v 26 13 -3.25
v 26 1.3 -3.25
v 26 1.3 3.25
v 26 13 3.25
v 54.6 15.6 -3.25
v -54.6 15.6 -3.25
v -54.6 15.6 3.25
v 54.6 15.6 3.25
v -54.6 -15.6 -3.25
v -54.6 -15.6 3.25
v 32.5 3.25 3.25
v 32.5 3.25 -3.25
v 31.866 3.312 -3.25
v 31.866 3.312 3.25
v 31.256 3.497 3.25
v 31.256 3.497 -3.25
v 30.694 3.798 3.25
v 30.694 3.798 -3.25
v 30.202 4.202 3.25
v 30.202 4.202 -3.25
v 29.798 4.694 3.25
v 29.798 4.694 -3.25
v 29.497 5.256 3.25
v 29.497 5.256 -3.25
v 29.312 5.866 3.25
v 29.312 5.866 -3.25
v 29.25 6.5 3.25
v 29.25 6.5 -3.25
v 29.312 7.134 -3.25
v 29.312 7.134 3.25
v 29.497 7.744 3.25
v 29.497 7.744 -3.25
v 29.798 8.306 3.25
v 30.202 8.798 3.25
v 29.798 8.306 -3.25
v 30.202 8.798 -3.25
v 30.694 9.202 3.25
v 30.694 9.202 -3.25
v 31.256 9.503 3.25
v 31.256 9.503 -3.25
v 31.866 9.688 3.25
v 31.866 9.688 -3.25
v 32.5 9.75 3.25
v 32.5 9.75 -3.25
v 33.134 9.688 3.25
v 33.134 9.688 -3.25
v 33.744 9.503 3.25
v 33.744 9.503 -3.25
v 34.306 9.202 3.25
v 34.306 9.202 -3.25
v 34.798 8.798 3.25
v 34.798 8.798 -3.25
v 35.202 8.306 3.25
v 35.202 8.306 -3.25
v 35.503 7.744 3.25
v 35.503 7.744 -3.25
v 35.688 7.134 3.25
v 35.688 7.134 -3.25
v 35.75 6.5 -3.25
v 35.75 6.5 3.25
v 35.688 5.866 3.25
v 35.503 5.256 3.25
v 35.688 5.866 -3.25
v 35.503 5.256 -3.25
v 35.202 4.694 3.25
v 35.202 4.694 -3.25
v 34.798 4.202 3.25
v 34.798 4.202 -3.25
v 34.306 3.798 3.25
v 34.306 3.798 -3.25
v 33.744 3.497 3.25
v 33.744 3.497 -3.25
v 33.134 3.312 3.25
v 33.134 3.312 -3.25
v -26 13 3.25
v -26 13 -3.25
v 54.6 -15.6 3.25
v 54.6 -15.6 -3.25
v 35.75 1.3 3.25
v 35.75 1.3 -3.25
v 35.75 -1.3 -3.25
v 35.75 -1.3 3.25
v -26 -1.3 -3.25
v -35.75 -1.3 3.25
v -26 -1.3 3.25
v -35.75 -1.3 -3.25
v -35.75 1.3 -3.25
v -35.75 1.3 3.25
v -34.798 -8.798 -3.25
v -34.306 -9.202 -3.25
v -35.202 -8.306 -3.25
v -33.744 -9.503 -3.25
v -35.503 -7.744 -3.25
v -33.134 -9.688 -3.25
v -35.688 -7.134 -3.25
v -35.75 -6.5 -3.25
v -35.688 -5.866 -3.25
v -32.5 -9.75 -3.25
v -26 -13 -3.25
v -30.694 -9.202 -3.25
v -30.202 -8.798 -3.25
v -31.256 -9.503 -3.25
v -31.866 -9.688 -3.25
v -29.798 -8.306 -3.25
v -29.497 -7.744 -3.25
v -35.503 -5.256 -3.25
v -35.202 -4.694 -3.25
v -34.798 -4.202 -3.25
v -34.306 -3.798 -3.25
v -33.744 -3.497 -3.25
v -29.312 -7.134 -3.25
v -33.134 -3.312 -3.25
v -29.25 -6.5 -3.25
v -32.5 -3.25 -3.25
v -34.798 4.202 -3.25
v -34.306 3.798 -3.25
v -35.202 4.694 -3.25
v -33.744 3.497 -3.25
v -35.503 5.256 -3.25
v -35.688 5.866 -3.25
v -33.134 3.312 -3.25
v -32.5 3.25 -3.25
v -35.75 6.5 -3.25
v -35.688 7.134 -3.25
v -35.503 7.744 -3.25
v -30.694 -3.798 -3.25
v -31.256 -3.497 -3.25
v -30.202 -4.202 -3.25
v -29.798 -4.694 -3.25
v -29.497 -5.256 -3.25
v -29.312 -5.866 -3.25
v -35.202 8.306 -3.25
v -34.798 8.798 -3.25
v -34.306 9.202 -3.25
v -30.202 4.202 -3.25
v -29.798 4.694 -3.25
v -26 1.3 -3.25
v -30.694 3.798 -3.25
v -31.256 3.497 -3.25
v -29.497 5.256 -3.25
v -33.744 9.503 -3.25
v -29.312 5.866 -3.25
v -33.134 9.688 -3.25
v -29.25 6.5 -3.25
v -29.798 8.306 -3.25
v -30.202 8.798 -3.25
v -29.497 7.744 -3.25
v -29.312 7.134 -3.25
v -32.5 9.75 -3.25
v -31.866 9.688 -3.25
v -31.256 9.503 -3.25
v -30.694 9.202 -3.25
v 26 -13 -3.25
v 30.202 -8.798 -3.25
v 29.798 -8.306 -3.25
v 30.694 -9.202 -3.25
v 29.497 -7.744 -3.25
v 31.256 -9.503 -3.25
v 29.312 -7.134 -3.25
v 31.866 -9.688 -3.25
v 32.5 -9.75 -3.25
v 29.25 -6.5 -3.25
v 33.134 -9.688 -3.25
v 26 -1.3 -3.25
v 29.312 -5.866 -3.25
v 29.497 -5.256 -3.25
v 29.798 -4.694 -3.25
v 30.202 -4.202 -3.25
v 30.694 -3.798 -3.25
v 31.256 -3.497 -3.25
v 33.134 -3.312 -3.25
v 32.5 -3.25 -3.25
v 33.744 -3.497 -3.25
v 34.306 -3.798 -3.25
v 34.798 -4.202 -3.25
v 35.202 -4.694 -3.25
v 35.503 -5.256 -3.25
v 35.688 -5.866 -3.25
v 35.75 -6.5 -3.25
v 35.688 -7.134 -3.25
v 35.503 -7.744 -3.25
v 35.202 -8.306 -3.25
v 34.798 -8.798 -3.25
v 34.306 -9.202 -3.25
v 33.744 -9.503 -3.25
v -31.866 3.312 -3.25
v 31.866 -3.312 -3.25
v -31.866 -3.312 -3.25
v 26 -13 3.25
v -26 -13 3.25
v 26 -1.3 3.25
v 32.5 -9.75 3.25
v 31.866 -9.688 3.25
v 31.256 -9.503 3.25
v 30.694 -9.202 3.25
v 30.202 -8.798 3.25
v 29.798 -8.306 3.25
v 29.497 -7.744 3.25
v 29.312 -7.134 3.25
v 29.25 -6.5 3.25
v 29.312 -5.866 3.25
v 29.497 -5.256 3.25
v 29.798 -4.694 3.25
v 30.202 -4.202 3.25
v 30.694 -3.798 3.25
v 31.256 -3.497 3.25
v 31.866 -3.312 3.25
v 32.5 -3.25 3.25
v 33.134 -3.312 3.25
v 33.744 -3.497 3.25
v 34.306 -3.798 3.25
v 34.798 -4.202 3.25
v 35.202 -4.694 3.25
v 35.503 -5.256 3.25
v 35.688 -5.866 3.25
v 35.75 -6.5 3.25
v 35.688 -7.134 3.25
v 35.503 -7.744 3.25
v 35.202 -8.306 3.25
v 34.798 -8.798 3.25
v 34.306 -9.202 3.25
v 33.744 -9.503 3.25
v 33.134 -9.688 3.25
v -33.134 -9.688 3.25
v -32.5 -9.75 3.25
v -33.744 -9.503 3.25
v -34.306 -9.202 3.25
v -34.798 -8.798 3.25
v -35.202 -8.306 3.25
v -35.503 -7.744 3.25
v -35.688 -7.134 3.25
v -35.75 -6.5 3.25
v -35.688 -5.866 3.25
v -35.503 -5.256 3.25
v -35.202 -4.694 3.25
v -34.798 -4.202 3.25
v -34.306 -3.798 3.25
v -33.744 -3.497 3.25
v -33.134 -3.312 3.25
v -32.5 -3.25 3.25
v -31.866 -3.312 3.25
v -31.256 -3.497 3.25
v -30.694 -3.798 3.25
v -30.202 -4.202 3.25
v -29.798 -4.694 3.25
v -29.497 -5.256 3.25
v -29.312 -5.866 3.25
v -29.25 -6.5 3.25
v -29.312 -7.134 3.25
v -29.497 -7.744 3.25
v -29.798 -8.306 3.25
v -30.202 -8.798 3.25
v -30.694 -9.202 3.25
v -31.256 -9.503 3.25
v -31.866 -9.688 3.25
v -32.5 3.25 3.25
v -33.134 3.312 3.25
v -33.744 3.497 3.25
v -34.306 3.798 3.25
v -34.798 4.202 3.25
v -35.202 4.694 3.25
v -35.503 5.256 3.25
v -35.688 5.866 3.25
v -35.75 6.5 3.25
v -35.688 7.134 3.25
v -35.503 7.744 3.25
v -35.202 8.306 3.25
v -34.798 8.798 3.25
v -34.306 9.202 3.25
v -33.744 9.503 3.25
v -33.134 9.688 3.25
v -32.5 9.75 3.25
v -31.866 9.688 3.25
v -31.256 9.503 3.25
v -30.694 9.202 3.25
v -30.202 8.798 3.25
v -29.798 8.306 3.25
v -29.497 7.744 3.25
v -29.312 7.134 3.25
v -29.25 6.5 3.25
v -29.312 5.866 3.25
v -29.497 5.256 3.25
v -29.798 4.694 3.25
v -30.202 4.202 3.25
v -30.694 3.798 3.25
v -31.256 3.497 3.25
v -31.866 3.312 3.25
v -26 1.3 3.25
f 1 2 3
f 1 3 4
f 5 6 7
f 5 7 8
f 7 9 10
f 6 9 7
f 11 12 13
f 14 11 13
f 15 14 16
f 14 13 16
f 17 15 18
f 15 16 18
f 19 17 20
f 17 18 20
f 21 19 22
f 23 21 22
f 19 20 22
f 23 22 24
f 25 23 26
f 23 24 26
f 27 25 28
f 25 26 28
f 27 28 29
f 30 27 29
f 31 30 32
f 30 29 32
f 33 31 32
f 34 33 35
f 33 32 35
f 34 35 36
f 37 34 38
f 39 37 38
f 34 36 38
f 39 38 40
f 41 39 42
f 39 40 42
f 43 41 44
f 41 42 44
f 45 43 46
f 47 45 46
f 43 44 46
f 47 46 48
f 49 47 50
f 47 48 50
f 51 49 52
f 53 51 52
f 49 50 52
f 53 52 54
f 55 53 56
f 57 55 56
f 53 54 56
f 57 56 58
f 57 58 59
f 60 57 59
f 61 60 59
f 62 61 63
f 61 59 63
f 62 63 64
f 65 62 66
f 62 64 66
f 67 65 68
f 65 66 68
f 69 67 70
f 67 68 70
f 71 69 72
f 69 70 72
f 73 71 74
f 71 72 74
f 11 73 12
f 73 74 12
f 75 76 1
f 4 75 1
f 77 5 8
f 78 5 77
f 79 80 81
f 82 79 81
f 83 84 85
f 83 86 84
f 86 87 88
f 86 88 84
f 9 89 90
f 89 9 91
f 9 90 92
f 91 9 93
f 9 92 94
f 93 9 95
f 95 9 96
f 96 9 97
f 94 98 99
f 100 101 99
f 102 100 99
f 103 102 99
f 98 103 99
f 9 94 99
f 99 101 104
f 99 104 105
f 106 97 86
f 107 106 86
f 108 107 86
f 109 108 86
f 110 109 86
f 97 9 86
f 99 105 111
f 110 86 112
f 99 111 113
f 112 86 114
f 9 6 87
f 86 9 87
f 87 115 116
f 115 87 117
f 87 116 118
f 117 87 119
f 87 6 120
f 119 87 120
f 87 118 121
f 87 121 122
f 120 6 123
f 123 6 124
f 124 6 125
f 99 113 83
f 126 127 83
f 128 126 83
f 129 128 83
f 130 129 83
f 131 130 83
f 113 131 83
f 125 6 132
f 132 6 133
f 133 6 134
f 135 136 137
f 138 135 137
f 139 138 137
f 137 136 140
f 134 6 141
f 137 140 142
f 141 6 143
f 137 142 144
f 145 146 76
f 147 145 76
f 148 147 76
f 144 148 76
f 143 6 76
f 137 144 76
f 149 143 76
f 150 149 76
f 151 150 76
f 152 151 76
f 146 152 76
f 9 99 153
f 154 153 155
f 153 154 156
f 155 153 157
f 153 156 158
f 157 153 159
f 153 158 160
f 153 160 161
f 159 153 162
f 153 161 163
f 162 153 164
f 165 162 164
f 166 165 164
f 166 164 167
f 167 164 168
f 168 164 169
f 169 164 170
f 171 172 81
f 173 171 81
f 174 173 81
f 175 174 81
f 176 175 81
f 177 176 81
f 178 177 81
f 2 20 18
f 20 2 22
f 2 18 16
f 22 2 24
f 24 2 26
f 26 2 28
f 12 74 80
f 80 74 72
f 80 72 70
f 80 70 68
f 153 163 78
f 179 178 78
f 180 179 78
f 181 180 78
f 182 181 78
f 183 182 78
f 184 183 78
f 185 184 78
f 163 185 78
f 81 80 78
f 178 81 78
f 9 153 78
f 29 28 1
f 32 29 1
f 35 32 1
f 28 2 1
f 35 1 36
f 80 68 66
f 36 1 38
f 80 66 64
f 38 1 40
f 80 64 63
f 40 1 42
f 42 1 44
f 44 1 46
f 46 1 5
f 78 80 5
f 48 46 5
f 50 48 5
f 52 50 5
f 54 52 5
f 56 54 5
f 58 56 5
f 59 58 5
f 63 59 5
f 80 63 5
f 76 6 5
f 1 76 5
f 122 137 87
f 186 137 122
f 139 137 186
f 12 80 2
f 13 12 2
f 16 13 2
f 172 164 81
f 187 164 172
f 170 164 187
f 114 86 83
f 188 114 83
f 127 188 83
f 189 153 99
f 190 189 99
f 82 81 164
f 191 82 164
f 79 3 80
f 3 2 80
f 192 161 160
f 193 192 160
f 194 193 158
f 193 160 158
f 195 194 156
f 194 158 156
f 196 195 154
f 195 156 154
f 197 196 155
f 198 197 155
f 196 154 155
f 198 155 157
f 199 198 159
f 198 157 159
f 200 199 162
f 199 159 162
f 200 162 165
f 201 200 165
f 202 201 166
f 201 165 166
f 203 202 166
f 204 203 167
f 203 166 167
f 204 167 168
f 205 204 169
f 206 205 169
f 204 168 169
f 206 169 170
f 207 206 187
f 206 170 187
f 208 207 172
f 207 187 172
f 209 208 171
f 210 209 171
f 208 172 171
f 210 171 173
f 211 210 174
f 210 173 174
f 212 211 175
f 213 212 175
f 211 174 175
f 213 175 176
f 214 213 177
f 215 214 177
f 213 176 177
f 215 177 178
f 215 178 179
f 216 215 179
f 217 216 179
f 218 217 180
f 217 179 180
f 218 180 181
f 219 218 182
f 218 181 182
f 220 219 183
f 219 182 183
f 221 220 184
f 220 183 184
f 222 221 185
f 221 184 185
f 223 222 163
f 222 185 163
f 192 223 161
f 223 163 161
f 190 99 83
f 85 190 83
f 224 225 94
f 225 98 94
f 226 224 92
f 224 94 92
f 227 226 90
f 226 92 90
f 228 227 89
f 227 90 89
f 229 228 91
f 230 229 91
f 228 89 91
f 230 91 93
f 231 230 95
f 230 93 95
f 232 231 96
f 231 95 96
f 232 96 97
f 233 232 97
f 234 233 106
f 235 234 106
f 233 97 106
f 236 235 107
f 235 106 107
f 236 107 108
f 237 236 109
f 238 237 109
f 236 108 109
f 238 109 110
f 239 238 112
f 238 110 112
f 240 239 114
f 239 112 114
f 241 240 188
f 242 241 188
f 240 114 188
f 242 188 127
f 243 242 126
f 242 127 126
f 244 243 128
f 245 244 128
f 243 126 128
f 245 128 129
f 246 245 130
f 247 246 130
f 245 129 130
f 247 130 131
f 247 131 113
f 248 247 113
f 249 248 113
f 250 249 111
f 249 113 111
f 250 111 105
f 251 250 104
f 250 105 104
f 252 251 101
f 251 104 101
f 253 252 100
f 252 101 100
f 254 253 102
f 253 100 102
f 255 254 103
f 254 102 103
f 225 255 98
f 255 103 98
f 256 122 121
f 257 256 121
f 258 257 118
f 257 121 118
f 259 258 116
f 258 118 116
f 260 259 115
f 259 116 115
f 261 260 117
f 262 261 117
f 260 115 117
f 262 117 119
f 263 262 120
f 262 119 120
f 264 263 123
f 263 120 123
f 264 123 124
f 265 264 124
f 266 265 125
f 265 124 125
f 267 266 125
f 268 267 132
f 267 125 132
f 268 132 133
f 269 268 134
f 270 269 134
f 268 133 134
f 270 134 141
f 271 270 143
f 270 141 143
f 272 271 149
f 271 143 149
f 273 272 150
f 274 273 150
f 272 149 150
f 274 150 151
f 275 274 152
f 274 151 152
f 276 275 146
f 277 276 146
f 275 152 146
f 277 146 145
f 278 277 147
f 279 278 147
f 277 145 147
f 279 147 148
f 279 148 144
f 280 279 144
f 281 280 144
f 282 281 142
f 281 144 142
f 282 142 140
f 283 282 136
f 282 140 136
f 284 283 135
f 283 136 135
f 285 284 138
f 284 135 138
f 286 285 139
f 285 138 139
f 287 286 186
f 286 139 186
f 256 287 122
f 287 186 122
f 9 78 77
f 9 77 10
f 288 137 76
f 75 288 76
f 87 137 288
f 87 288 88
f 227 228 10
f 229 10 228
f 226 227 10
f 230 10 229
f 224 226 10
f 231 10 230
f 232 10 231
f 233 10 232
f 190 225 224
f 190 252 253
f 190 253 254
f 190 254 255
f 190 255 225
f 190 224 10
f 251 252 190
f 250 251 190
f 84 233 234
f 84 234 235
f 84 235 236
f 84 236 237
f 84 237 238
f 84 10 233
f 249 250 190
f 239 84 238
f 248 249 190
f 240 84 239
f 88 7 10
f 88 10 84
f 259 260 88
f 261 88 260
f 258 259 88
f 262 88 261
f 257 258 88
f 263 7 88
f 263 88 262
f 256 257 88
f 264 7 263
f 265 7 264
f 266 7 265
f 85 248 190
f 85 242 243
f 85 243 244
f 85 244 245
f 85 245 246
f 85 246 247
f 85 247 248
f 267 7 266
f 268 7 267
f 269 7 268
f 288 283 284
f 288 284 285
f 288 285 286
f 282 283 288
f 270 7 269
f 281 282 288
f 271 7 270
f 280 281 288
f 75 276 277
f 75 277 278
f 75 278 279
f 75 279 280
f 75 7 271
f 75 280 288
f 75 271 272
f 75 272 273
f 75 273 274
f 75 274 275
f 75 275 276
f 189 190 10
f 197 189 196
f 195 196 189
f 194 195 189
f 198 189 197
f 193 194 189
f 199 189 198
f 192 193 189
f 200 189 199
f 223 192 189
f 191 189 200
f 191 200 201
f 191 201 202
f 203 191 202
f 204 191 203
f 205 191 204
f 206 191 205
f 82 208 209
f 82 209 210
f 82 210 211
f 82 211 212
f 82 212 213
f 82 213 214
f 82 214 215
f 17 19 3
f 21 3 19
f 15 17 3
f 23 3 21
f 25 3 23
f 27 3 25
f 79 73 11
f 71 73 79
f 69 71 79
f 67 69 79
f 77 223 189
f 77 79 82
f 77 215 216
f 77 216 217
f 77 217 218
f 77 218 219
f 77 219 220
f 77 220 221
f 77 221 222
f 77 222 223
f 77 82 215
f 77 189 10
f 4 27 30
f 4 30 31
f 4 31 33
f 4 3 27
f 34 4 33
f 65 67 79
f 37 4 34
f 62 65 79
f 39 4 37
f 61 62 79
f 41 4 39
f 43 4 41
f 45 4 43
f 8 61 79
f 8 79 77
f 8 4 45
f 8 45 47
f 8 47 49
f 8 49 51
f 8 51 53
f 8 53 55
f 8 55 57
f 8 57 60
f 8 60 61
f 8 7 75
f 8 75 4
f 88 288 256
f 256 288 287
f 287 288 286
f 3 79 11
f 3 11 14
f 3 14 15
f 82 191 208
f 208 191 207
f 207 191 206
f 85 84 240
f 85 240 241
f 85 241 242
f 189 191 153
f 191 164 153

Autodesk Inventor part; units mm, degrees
ref_plane "YZ Plane" through (0, 0, 0) normal (1, 0, 0) x (0, 1, 0)
ref_plane "XZ Plane" through (0, 0, 0) normal (0, 1, 0) x (-1, 0, 0)
ref_plane "XY Plane" through (0, 0, 0) normal (0, 0, 1) x (1, 0, 0)
sketch "Sketch1" plane through (0, 0, 0) normal (0, 0, 1) x (1, 0, 0)
  line L0 (-26, 13) -> (26, 13)
  line L1 (26, -13) -> (-26, -13)
  line L2 (-26, 13) -> (26, -13) construction
  line L3 (26, 13) -> (-26, -13) construction
  line L4 (-54.6, 15.6) -> (54.6, 15.6)
  line L5 (54.6, 15.6) -> (54.6, -15.6)
  line L6 (54.6, -15.6) -> (-54.6, -15.6)
  line L7 (-54.6, -15.6) -> (-54.6, 15.6)
  line L8 (-54.6, 15.6) -> (54.6, -15.6) construction
  line L9 (54.6, 15.6) -> (-54.6, -15.6) construction
  line L10 (-26, 1.3) -> (-35.75, 1.3)
  line L11 (-35.75, 1.3) -> (-35.75, -1.3)
  line L12 (-35.75, -1.3) -> (-26, -1.3)
  line L13 (26, 1.3) -> (35.75, 1.3)
  line L14 (35.75, 1.3) -> (35.75, -1.3)
  line L15 (35.75, -1.3) -> (26, -1.3)
  line L16 (-26, 1.3) -> (-26, 13)
  line L17 (-26, -13) -> (-26, -1.3)
  line L18 (26, -1.3) -> (26, -13)
  line L19 (26, 1.3) -> (26, 13)
  point P0 (0, 0)
  point P1 (-35.75, 0)
  point P2 (0, 0)
  dimension "CInt" = 52
  dimension "LInt" = 26
  dimension "Cext" = 109.2
  dimension "Lext" = 31.2
  dimension "Cpeq" = 9.75
  dimension "Lpeq" = 2.6
  dimension "d10" = 9.75
  dimension "d11" = 2.6
extrude "Extrusion1" add sketch "Sketch1" along normal mid plane 6.5
sketch "Sketch8" plane through (0, 0, 3.25) normal (0, 0, 1) x (1, 0, 0)
  point P0 (0, 0)
hole "Hole1" at (-32.5, 6.5, 3.25) direction (0, 0, -1) diameter 6.5 end through all
pattern_linear "Rectangular Pattern1" count 2 spacing 13 along (0, -1, 0) of "Hole1"
hole "Hole2" at (32.5, 6.5, 3.25) direction (0, 0, -1) diameter 6.5 end through all
pattern_linear "Rectangular Pattern2" count 2 spacing 13 along (0, -1, 0) of "Hole2"
properties part number "Cou-2"
